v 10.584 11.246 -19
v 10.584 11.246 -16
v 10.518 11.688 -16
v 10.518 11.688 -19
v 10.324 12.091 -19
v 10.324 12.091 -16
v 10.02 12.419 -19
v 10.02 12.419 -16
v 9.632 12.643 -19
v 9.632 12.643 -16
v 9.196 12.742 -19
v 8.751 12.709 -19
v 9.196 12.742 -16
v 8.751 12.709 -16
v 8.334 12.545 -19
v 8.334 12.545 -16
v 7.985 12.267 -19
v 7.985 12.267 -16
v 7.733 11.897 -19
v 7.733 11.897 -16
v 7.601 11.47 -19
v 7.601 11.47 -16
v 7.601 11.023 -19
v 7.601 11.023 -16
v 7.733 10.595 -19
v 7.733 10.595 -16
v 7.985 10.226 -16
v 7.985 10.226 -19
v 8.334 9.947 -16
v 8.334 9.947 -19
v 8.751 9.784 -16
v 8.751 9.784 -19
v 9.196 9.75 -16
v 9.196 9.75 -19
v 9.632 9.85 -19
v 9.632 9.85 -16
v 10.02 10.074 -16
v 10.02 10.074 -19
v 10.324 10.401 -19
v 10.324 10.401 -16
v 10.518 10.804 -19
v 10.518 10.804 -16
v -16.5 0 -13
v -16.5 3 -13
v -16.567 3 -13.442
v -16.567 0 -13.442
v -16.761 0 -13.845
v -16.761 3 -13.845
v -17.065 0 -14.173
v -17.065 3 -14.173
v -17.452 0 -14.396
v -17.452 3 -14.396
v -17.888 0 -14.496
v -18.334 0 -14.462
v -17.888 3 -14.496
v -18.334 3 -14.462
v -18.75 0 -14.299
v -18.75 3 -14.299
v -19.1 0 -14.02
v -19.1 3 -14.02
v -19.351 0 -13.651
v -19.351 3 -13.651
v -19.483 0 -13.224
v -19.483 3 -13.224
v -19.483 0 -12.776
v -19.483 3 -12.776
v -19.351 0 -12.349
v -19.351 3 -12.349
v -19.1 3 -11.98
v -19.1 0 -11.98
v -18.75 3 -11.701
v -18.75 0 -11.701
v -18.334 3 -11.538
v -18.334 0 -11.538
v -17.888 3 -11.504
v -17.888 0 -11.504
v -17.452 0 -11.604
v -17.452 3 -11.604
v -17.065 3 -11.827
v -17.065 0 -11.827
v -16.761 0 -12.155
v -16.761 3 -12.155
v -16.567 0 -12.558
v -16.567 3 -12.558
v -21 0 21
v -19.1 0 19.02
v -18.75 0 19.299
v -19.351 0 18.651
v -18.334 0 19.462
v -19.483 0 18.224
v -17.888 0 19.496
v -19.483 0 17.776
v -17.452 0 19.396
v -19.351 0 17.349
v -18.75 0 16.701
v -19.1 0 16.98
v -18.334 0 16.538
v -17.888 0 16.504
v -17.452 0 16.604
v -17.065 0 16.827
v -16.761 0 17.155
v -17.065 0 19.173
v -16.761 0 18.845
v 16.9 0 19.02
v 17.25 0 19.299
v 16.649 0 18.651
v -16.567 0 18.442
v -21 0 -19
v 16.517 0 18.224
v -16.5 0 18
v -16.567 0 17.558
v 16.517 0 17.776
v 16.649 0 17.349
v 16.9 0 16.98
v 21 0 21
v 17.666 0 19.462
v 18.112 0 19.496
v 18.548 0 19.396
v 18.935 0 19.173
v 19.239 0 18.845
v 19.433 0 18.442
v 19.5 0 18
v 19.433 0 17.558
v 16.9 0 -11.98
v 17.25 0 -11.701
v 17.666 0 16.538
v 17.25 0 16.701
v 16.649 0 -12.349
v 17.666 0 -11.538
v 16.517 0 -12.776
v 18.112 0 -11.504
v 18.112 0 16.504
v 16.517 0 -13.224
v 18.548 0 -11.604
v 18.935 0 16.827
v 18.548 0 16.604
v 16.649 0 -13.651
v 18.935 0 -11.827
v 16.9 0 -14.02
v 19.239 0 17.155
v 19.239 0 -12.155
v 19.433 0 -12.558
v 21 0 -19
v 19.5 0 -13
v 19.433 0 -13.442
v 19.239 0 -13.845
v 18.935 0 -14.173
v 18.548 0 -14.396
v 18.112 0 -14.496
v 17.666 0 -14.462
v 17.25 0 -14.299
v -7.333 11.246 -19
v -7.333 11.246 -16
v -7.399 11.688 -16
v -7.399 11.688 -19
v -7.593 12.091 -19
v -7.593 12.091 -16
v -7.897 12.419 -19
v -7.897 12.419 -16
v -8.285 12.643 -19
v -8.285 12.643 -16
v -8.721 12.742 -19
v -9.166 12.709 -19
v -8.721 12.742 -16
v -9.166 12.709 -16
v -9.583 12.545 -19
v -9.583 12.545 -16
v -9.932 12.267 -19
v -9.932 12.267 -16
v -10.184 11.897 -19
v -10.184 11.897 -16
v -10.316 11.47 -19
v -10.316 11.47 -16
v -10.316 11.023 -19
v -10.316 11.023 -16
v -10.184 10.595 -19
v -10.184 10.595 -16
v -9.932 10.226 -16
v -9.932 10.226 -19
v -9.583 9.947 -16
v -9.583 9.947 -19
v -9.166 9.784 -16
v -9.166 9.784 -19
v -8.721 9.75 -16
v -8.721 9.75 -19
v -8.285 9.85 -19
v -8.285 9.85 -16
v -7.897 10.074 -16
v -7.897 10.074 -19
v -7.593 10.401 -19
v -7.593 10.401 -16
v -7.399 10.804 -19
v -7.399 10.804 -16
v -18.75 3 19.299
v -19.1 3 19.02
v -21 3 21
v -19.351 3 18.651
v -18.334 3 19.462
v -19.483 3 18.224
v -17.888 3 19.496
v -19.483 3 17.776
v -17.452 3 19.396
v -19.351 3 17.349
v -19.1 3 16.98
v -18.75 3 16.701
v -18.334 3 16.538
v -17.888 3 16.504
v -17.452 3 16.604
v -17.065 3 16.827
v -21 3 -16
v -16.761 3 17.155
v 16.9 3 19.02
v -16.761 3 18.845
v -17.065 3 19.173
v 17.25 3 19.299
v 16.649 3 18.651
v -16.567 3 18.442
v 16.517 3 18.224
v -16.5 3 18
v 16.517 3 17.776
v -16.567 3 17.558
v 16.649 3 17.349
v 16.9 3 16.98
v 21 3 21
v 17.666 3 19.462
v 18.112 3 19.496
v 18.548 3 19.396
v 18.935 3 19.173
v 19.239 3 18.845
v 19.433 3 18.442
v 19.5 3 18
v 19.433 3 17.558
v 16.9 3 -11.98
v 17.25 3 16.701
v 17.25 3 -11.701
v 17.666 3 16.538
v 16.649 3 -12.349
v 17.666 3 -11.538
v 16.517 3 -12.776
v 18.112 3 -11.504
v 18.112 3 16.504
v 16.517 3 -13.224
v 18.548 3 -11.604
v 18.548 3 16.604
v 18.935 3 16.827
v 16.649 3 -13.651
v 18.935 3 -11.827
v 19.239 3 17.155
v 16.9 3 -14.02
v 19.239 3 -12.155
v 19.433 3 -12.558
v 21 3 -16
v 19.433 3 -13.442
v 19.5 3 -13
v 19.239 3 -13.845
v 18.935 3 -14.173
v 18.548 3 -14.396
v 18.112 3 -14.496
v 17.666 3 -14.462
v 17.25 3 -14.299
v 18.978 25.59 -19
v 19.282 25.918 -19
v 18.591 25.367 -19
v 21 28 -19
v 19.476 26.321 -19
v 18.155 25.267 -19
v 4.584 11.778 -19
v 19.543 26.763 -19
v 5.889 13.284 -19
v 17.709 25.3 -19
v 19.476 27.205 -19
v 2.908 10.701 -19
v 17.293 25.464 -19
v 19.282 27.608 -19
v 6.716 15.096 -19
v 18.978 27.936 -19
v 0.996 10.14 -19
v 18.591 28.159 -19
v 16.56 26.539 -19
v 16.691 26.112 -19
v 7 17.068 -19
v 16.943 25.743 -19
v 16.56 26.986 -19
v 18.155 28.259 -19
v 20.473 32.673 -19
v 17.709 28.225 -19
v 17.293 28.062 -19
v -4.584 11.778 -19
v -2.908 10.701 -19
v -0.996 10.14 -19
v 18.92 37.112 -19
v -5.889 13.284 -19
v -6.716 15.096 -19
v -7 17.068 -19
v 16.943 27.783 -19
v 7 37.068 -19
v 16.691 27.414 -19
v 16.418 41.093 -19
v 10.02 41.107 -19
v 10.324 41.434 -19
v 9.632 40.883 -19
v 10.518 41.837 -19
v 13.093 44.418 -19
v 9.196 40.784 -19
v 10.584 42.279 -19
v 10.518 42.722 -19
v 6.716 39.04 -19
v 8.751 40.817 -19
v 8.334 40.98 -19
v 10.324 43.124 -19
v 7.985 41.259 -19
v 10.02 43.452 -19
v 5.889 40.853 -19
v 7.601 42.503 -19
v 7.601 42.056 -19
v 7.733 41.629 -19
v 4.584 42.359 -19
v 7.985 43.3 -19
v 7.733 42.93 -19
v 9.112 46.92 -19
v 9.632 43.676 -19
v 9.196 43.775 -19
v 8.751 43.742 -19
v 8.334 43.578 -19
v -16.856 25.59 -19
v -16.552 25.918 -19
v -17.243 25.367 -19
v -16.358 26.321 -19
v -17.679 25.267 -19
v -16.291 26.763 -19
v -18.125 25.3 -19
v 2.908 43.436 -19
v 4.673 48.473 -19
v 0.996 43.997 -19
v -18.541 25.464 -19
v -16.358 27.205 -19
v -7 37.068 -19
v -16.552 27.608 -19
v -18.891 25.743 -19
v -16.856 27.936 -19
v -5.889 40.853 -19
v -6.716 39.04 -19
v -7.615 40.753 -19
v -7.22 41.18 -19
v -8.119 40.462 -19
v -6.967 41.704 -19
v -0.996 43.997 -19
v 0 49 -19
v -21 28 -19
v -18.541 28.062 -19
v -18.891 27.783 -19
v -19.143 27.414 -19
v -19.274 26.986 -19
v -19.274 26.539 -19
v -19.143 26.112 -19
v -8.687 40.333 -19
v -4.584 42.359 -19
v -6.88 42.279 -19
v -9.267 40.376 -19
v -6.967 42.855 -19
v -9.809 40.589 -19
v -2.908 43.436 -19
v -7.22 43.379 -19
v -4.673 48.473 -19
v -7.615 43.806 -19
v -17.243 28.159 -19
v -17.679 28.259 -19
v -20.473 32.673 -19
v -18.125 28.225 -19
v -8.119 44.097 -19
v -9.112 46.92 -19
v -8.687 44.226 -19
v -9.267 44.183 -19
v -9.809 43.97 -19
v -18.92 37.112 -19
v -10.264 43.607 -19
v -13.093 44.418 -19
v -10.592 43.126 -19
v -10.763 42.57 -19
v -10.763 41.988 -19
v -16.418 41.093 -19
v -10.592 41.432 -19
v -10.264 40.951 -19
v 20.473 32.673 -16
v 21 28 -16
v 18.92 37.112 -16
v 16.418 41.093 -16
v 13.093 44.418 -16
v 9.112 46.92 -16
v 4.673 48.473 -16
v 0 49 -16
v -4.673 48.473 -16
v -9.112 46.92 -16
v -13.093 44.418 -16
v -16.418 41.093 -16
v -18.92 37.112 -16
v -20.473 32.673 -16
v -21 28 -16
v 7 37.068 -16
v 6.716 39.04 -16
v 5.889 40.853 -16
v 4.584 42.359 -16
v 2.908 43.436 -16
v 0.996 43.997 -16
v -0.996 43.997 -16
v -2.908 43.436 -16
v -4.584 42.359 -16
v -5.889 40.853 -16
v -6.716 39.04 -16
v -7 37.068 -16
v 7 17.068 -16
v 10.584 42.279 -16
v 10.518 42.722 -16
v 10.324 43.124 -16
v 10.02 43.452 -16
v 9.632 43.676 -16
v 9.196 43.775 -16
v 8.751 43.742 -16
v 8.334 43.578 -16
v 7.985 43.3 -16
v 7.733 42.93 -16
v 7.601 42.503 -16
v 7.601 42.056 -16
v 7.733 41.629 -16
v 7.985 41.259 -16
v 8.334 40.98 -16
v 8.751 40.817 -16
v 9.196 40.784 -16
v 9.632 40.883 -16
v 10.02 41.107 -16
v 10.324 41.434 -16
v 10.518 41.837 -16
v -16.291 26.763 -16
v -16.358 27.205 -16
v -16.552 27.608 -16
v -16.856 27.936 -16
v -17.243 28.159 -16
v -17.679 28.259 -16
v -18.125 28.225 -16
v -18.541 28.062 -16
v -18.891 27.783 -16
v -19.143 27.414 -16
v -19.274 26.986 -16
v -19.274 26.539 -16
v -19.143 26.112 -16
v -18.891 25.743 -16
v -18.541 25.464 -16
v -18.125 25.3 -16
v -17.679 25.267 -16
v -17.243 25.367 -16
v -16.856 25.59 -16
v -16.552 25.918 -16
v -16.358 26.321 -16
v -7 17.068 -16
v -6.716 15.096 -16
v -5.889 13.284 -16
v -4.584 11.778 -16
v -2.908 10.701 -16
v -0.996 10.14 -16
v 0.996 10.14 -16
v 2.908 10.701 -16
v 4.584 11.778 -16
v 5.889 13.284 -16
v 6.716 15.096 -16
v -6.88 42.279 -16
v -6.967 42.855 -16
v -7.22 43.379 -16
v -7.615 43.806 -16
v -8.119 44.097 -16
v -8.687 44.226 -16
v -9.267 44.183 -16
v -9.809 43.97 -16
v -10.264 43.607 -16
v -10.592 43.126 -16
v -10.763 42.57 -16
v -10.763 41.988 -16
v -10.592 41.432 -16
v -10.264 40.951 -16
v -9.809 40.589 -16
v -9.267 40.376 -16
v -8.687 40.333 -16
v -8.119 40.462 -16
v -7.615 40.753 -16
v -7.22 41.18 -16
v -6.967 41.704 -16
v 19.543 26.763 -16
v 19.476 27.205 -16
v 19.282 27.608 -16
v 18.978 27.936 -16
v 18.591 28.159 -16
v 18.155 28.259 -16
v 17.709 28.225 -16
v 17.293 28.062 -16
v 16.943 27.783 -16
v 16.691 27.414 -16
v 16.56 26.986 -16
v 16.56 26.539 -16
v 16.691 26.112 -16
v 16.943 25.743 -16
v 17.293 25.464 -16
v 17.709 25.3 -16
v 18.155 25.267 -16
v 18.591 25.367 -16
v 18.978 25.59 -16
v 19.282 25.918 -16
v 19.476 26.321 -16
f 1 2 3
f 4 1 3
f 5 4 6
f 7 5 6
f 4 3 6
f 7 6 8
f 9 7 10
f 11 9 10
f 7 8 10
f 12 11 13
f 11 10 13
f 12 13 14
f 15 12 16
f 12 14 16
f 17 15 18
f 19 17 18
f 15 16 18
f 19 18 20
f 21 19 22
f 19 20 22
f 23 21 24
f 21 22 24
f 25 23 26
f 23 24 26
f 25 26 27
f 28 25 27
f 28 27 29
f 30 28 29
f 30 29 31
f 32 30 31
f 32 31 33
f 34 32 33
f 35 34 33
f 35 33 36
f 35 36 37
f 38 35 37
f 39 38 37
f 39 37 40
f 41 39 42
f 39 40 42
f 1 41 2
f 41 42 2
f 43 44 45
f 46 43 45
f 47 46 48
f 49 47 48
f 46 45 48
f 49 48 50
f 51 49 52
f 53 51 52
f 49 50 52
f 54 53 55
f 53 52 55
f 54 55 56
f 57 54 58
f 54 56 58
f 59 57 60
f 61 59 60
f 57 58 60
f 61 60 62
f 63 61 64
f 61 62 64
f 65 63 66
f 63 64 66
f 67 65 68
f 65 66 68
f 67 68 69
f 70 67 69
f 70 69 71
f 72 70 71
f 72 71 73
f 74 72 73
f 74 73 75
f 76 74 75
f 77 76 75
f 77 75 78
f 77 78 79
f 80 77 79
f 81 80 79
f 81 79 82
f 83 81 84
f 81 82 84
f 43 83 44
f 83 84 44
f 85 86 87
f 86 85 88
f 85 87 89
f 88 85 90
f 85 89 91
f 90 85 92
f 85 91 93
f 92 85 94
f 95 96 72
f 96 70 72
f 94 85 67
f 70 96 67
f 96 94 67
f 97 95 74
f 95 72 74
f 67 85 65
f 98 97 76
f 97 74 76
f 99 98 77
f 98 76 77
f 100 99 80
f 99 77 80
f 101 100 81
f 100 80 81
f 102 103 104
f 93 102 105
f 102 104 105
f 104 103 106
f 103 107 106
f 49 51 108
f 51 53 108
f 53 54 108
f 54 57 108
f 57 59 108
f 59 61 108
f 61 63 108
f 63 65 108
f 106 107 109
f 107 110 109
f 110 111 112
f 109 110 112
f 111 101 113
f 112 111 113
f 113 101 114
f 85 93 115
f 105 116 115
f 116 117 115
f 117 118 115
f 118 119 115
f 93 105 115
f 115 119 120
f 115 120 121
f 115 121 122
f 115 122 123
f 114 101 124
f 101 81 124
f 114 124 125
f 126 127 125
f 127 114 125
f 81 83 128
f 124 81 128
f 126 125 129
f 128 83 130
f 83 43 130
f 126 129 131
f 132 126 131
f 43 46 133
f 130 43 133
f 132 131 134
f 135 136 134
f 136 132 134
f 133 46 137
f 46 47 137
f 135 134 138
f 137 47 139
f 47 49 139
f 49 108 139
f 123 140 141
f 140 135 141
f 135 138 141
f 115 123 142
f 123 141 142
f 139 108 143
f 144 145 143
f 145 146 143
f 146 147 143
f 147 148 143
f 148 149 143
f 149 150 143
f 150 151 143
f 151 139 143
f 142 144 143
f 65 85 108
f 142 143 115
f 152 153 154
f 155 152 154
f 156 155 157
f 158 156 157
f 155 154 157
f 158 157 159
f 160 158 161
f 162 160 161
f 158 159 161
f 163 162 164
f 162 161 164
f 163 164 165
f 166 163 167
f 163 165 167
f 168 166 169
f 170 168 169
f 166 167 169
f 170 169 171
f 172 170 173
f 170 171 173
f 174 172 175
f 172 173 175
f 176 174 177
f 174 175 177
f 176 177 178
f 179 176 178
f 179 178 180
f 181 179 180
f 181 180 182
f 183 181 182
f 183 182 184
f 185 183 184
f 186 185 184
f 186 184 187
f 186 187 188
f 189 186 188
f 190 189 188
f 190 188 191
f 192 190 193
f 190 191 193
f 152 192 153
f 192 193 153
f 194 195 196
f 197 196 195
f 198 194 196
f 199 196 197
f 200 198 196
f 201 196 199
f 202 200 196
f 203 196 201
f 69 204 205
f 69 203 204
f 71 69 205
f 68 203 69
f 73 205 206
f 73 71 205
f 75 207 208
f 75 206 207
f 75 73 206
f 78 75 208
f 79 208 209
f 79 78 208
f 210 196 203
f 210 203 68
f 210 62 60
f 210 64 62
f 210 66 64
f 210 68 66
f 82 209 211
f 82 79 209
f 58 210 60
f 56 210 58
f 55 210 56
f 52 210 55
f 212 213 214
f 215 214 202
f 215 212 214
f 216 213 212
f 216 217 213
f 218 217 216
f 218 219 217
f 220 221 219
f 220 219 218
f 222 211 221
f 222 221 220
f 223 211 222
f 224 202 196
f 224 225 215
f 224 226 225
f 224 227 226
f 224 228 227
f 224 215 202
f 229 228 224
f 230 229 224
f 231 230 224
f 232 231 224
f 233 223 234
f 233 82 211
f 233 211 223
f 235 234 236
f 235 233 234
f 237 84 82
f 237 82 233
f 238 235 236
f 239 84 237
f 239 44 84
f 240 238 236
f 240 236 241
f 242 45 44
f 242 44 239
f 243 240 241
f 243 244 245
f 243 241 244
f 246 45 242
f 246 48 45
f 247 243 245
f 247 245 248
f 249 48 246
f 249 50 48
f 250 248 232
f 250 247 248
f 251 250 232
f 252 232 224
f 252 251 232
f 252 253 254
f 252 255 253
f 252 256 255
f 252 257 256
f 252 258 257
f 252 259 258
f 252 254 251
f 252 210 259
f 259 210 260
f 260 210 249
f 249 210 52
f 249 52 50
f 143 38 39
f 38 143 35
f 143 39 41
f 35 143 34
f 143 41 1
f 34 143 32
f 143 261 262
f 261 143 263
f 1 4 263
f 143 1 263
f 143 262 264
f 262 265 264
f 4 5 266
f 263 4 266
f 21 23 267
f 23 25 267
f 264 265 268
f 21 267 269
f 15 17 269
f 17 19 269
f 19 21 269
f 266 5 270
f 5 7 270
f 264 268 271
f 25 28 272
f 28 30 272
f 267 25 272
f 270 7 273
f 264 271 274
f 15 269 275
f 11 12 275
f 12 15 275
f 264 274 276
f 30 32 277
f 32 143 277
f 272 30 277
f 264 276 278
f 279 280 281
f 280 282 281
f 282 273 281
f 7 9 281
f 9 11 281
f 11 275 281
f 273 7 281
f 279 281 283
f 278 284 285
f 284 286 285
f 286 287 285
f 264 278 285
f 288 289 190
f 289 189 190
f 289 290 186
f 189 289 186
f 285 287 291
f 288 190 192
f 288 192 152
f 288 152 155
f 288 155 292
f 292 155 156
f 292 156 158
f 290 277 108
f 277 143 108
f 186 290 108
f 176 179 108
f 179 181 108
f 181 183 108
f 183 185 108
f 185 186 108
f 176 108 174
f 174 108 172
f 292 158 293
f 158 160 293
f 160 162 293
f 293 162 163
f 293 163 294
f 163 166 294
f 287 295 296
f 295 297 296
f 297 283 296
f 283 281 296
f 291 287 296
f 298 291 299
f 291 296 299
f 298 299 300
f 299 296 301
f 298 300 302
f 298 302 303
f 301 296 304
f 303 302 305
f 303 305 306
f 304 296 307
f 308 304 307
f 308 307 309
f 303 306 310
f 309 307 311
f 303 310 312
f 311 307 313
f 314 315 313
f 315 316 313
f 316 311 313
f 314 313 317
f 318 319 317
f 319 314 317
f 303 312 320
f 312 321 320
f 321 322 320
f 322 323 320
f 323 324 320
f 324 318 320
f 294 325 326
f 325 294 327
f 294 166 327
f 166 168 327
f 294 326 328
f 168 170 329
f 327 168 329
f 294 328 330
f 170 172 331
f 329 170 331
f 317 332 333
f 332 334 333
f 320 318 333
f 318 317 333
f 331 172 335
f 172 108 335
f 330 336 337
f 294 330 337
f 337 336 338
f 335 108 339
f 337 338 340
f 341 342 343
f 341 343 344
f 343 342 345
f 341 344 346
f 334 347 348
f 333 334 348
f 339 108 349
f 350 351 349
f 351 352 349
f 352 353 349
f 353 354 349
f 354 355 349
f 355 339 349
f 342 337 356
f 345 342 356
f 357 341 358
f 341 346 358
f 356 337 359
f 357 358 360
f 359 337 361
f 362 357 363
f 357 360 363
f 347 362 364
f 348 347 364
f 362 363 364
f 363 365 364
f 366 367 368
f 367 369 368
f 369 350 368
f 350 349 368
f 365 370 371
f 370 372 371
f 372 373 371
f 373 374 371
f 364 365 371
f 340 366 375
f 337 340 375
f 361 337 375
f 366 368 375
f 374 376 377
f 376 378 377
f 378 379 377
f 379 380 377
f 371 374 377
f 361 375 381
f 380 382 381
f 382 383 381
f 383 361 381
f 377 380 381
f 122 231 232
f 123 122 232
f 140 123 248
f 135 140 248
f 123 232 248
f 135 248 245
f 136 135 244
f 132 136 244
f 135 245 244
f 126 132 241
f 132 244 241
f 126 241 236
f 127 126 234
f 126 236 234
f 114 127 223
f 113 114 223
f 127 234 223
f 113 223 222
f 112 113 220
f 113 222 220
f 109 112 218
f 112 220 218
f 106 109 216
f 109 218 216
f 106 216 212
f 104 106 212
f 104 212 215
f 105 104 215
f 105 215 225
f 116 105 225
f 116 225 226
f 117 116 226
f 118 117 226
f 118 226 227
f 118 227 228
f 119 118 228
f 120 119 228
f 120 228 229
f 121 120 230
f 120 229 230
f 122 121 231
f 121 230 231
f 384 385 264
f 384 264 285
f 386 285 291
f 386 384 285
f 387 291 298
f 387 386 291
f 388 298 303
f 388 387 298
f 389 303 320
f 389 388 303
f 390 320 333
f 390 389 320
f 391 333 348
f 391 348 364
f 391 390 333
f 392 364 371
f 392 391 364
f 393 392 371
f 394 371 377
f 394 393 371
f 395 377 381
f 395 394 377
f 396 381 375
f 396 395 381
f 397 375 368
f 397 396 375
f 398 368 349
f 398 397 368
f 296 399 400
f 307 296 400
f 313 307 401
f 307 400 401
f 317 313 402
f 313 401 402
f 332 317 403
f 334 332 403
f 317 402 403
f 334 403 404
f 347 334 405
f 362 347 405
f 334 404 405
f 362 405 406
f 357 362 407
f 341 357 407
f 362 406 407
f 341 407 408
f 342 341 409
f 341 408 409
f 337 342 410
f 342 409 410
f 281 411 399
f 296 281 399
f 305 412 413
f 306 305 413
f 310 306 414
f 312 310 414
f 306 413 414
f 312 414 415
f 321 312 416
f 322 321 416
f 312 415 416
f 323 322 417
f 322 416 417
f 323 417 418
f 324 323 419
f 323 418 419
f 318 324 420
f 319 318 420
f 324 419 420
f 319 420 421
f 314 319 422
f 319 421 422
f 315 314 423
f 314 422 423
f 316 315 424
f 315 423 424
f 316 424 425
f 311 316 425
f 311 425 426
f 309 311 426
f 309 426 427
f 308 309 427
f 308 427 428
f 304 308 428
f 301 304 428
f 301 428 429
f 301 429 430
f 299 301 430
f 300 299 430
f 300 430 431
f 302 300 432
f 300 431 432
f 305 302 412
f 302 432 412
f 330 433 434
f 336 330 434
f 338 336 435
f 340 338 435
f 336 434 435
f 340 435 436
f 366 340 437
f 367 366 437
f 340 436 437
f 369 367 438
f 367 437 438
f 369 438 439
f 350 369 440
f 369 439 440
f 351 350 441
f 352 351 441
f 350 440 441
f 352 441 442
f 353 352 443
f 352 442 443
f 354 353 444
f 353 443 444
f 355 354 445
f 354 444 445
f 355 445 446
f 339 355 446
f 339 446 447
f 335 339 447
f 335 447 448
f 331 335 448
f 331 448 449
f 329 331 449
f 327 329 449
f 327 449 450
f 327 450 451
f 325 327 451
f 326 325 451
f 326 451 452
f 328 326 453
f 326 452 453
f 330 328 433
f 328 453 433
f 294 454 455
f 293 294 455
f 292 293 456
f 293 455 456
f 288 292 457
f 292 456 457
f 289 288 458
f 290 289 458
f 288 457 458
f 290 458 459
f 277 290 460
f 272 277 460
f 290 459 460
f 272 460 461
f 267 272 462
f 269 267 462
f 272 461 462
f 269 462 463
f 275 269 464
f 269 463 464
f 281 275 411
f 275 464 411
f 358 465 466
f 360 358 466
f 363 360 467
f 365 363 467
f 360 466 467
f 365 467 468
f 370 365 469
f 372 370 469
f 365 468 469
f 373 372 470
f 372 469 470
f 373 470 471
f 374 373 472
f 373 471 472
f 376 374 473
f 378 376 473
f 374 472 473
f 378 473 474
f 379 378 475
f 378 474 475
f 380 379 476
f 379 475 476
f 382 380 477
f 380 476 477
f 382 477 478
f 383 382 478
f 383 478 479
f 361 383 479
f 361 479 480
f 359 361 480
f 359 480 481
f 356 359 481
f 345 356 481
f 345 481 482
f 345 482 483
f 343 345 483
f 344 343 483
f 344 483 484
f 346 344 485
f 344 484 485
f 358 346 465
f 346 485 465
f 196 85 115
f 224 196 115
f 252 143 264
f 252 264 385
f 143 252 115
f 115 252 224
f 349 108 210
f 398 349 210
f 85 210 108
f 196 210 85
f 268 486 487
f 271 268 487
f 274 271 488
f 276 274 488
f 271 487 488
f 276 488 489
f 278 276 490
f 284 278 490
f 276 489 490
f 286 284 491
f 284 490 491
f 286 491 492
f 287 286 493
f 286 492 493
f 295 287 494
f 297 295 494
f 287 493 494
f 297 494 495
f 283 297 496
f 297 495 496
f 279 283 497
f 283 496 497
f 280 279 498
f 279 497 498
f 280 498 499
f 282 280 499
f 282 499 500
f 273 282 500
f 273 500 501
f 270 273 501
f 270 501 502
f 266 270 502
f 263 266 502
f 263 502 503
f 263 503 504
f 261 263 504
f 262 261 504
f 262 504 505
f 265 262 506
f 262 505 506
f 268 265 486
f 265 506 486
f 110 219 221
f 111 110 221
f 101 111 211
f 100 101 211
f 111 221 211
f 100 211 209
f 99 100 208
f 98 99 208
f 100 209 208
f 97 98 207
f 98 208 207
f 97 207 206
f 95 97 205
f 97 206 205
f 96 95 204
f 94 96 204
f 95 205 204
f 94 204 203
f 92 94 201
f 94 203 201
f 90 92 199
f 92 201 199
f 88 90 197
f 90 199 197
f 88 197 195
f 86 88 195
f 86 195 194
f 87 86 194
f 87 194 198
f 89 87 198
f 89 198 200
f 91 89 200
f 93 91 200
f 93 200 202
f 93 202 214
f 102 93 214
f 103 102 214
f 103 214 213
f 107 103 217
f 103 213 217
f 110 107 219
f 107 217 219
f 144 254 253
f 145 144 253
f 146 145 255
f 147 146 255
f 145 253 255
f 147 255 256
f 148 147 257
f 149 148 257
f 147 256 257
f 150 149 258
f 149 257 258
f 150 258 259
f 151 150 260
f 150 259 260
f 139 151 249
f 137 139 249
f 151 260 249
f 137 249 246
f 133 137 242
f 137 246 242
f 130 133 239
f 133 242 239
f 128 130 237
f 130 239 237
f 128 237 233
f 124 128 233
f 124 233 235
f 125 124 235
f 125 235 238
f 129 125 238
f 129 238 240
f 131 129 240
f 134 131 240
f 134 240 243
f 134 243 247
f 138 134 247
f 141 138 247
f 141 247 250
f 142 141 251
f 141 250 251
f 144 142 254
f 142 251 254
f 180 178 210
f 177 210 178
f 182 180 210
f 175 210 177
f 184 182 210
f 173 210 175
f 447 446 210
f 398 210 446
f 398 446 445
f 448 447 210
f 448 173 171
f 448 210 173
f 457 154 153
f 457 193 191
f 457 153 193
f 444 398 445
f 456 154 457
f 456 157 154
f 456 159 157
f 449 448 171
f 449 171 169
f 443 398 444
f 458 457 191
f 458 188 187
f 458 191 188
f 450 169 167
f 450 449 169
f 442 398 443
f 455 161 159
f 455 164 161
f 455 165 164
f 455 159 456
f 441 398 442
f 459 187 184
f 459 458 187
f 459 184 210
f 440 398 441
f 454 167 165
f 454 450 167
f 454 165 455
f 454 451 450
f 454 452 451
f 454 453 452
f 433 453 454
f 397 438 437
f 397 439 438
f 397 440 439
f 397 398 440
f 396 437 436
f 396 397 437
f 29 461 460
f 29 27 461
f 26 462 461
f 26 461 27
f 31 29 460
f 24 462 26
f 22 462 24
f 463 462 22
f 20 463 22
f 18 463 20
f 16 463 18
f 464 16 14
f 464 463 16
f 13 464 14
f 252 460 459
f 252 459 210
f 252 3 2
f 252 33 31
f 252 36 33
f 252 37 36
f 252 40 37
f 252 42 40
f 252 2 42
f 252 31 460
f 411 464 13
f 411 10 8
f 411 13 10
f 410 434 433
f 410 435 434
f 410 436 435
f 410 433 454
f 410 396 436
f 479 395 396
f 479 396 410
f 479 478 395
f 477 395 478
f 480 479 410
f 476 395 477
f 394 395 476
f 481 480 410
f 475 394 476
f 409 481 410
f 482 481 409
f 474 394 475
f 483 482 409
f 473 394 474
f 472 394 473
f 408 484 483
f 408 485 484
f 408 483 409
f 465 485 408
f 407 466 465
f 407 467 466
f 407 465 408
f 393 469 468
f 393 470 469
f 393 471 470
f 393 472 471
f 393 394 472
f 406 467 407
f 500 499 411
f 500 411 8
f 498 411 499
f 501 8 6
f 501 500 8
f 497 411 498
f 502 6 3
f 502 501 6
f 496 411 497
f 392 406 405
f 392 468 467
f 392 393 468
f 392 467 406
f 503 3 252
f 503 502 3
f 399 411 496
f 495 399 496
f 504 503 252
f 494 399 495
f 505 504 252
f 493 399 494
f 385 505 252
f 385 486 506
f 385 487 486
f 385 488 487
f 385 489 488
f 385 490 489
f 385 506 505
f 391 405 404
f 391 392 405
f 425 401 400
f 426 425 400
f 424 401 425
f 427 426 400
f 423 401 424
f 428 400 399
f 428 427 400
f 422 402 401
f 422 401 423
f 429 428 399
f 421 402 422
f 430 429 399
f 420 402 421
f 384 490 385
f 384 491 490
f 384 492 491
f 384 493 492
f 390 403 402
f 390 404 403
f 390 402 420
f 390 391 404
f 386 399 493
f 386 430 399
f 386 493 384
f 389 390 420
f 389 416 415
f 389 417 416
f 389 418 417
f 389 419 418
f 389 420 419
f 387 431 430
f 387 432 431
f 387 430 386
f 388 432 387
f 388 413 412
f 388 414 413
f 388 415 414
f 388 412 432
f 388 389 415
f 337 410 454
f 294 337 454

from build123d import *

# Parameters (mm, degrees)
SKETCH_4_W           = 42
SKETCH_4_H           = 40
EXTRUDE_1_DEPTH      = 3
SKETCH_9_W           = 3
SKETCH_9_H           = 25
EXTRUDE_3_DEPTH      = 42
SKETCH_10_R          = 21
EXTRUDE_2_DEPTH      = 3
CUT_EXTRUDE_6_DEPTH  = 3
SKETCH_16_R          = 1.5
CUT_EXTRUDE_7_DEPTH  = 3
SKETCH_14_R          = 1.952306129
CUT_EXTRUDE_8_DEPTH  = 3
SKETCH_17_R          = 1.5
CUT_EXTRUDE_10_DEPTH = 3


with BuildPart() as part:
    # 草图4 → 凸台-拉伸1 (new body)
    with BuildSketch(Plane(origin=(0, 0, 0), x_dir=(1, 0, 0), z_dir=(0, 1, 0))):
        with Locations((0, -1)):
            Rectangle(SKETCH_4_W, SKETCH_4_H)
    extrude(amount=EXTRUDE_1_DEPTH)

    # 草图9 → 拉伸-薄壁3 (add)
    with BuildSketch(Plane.ZY.offset(21)):
        with Locations((-17.5, 15.5)):
            Rectangle(SKETCH_9_W, SKETCH_9_H)
    extrude(amount=-EXTRUDE_3_DEPTH)

    # 草图10 → 凸台-拉伸2 (add)
    with BuildSketch(Plane.XY.offset(-16)):
        with Locations((0, 28)):
            Circle(SKETCH_10_R)
    extrude(amount=-EXTRUDE_2_DEPTH)

    # 草图11 → 切除-拉伸6 (cut)
    with BuildSketch(Plane.XY.offset(-16)):
        with BuildLine():
            Line((-7, 37.068273953), (-7, 17.068273953))
            ThreePointArc((-7, 17.068273953), (0, 10.068273953), (7, 17.068273953))
            Line((7, 17.068273953), (7, 37.068273953))
            ThreePointArc((7, 37.068273953), (0, 44.068273953), (-7, 37.068273953))
        make_face()
    extrude(amount=-CUT_EXTRUDE_6_DEPTH, mode=Mode.SUBTRACT)

    # 草图16 → 切除-拉伸7 (cut)
    with BuildSketch(Plane.XY.offset(-16)):
        with Locations((-8.832661919, 42.279402206)):
            Circle(SKETCH_16_R)
        with Locations((-17.791157853, 26.76283209)):
            Circle(SKETCH_16_R)
        with Locations((-8.832661919, 11.246261974)):
            Circle(SKETCH_16_R)
        with Locations((9.084329947, 11.246261974)):
            Circle(SKETCH_16_R)
        with Locations((18.04282588, 26.76283209)):
            Circle(SKETCH_16_R)
        with Locations((9.084329947, 42.279402206)):
            Circle(SKETCH_16_R)
    extrude(amount=-CUT_EXTRUDE_7_DEPTH, mode=Mode.SUBTRACT)

    # 草图14 → 切除-拉伸8 (cut)
    with BuildSketch(Plane.XY.offset(-16)):
        with Locations((-8.832661919, 42.279402206)):
            Circle(SKETCH_14_R)
    extrude(amount=-CUT_EXTRUDE_8_DEPTH, mode=Mode.SUBTRACT)

    # 草图17 → 切除-拉伸10 (cut)
    with BuildSketch(Plane(origin=(0, 3, 0), x_dir=(1, 0, 0), z_dir=(0, 1, 0))):
        with Locations((-18, 13)):
            Circle(SKETCH_17_R)
        with Locations((18, 13)):
            Circle(SKETCH_17_R)
        with Locations((-18, -18)):
            Circle(SKETCH_17_R)
        with Locations((18, -18)):
            Circle(SKETCH_17_R)
    extrude(amount=-CUT_EXTRUDE_10_DEPTH, mode=Mode.SUBTRACT)


solid = part.part
